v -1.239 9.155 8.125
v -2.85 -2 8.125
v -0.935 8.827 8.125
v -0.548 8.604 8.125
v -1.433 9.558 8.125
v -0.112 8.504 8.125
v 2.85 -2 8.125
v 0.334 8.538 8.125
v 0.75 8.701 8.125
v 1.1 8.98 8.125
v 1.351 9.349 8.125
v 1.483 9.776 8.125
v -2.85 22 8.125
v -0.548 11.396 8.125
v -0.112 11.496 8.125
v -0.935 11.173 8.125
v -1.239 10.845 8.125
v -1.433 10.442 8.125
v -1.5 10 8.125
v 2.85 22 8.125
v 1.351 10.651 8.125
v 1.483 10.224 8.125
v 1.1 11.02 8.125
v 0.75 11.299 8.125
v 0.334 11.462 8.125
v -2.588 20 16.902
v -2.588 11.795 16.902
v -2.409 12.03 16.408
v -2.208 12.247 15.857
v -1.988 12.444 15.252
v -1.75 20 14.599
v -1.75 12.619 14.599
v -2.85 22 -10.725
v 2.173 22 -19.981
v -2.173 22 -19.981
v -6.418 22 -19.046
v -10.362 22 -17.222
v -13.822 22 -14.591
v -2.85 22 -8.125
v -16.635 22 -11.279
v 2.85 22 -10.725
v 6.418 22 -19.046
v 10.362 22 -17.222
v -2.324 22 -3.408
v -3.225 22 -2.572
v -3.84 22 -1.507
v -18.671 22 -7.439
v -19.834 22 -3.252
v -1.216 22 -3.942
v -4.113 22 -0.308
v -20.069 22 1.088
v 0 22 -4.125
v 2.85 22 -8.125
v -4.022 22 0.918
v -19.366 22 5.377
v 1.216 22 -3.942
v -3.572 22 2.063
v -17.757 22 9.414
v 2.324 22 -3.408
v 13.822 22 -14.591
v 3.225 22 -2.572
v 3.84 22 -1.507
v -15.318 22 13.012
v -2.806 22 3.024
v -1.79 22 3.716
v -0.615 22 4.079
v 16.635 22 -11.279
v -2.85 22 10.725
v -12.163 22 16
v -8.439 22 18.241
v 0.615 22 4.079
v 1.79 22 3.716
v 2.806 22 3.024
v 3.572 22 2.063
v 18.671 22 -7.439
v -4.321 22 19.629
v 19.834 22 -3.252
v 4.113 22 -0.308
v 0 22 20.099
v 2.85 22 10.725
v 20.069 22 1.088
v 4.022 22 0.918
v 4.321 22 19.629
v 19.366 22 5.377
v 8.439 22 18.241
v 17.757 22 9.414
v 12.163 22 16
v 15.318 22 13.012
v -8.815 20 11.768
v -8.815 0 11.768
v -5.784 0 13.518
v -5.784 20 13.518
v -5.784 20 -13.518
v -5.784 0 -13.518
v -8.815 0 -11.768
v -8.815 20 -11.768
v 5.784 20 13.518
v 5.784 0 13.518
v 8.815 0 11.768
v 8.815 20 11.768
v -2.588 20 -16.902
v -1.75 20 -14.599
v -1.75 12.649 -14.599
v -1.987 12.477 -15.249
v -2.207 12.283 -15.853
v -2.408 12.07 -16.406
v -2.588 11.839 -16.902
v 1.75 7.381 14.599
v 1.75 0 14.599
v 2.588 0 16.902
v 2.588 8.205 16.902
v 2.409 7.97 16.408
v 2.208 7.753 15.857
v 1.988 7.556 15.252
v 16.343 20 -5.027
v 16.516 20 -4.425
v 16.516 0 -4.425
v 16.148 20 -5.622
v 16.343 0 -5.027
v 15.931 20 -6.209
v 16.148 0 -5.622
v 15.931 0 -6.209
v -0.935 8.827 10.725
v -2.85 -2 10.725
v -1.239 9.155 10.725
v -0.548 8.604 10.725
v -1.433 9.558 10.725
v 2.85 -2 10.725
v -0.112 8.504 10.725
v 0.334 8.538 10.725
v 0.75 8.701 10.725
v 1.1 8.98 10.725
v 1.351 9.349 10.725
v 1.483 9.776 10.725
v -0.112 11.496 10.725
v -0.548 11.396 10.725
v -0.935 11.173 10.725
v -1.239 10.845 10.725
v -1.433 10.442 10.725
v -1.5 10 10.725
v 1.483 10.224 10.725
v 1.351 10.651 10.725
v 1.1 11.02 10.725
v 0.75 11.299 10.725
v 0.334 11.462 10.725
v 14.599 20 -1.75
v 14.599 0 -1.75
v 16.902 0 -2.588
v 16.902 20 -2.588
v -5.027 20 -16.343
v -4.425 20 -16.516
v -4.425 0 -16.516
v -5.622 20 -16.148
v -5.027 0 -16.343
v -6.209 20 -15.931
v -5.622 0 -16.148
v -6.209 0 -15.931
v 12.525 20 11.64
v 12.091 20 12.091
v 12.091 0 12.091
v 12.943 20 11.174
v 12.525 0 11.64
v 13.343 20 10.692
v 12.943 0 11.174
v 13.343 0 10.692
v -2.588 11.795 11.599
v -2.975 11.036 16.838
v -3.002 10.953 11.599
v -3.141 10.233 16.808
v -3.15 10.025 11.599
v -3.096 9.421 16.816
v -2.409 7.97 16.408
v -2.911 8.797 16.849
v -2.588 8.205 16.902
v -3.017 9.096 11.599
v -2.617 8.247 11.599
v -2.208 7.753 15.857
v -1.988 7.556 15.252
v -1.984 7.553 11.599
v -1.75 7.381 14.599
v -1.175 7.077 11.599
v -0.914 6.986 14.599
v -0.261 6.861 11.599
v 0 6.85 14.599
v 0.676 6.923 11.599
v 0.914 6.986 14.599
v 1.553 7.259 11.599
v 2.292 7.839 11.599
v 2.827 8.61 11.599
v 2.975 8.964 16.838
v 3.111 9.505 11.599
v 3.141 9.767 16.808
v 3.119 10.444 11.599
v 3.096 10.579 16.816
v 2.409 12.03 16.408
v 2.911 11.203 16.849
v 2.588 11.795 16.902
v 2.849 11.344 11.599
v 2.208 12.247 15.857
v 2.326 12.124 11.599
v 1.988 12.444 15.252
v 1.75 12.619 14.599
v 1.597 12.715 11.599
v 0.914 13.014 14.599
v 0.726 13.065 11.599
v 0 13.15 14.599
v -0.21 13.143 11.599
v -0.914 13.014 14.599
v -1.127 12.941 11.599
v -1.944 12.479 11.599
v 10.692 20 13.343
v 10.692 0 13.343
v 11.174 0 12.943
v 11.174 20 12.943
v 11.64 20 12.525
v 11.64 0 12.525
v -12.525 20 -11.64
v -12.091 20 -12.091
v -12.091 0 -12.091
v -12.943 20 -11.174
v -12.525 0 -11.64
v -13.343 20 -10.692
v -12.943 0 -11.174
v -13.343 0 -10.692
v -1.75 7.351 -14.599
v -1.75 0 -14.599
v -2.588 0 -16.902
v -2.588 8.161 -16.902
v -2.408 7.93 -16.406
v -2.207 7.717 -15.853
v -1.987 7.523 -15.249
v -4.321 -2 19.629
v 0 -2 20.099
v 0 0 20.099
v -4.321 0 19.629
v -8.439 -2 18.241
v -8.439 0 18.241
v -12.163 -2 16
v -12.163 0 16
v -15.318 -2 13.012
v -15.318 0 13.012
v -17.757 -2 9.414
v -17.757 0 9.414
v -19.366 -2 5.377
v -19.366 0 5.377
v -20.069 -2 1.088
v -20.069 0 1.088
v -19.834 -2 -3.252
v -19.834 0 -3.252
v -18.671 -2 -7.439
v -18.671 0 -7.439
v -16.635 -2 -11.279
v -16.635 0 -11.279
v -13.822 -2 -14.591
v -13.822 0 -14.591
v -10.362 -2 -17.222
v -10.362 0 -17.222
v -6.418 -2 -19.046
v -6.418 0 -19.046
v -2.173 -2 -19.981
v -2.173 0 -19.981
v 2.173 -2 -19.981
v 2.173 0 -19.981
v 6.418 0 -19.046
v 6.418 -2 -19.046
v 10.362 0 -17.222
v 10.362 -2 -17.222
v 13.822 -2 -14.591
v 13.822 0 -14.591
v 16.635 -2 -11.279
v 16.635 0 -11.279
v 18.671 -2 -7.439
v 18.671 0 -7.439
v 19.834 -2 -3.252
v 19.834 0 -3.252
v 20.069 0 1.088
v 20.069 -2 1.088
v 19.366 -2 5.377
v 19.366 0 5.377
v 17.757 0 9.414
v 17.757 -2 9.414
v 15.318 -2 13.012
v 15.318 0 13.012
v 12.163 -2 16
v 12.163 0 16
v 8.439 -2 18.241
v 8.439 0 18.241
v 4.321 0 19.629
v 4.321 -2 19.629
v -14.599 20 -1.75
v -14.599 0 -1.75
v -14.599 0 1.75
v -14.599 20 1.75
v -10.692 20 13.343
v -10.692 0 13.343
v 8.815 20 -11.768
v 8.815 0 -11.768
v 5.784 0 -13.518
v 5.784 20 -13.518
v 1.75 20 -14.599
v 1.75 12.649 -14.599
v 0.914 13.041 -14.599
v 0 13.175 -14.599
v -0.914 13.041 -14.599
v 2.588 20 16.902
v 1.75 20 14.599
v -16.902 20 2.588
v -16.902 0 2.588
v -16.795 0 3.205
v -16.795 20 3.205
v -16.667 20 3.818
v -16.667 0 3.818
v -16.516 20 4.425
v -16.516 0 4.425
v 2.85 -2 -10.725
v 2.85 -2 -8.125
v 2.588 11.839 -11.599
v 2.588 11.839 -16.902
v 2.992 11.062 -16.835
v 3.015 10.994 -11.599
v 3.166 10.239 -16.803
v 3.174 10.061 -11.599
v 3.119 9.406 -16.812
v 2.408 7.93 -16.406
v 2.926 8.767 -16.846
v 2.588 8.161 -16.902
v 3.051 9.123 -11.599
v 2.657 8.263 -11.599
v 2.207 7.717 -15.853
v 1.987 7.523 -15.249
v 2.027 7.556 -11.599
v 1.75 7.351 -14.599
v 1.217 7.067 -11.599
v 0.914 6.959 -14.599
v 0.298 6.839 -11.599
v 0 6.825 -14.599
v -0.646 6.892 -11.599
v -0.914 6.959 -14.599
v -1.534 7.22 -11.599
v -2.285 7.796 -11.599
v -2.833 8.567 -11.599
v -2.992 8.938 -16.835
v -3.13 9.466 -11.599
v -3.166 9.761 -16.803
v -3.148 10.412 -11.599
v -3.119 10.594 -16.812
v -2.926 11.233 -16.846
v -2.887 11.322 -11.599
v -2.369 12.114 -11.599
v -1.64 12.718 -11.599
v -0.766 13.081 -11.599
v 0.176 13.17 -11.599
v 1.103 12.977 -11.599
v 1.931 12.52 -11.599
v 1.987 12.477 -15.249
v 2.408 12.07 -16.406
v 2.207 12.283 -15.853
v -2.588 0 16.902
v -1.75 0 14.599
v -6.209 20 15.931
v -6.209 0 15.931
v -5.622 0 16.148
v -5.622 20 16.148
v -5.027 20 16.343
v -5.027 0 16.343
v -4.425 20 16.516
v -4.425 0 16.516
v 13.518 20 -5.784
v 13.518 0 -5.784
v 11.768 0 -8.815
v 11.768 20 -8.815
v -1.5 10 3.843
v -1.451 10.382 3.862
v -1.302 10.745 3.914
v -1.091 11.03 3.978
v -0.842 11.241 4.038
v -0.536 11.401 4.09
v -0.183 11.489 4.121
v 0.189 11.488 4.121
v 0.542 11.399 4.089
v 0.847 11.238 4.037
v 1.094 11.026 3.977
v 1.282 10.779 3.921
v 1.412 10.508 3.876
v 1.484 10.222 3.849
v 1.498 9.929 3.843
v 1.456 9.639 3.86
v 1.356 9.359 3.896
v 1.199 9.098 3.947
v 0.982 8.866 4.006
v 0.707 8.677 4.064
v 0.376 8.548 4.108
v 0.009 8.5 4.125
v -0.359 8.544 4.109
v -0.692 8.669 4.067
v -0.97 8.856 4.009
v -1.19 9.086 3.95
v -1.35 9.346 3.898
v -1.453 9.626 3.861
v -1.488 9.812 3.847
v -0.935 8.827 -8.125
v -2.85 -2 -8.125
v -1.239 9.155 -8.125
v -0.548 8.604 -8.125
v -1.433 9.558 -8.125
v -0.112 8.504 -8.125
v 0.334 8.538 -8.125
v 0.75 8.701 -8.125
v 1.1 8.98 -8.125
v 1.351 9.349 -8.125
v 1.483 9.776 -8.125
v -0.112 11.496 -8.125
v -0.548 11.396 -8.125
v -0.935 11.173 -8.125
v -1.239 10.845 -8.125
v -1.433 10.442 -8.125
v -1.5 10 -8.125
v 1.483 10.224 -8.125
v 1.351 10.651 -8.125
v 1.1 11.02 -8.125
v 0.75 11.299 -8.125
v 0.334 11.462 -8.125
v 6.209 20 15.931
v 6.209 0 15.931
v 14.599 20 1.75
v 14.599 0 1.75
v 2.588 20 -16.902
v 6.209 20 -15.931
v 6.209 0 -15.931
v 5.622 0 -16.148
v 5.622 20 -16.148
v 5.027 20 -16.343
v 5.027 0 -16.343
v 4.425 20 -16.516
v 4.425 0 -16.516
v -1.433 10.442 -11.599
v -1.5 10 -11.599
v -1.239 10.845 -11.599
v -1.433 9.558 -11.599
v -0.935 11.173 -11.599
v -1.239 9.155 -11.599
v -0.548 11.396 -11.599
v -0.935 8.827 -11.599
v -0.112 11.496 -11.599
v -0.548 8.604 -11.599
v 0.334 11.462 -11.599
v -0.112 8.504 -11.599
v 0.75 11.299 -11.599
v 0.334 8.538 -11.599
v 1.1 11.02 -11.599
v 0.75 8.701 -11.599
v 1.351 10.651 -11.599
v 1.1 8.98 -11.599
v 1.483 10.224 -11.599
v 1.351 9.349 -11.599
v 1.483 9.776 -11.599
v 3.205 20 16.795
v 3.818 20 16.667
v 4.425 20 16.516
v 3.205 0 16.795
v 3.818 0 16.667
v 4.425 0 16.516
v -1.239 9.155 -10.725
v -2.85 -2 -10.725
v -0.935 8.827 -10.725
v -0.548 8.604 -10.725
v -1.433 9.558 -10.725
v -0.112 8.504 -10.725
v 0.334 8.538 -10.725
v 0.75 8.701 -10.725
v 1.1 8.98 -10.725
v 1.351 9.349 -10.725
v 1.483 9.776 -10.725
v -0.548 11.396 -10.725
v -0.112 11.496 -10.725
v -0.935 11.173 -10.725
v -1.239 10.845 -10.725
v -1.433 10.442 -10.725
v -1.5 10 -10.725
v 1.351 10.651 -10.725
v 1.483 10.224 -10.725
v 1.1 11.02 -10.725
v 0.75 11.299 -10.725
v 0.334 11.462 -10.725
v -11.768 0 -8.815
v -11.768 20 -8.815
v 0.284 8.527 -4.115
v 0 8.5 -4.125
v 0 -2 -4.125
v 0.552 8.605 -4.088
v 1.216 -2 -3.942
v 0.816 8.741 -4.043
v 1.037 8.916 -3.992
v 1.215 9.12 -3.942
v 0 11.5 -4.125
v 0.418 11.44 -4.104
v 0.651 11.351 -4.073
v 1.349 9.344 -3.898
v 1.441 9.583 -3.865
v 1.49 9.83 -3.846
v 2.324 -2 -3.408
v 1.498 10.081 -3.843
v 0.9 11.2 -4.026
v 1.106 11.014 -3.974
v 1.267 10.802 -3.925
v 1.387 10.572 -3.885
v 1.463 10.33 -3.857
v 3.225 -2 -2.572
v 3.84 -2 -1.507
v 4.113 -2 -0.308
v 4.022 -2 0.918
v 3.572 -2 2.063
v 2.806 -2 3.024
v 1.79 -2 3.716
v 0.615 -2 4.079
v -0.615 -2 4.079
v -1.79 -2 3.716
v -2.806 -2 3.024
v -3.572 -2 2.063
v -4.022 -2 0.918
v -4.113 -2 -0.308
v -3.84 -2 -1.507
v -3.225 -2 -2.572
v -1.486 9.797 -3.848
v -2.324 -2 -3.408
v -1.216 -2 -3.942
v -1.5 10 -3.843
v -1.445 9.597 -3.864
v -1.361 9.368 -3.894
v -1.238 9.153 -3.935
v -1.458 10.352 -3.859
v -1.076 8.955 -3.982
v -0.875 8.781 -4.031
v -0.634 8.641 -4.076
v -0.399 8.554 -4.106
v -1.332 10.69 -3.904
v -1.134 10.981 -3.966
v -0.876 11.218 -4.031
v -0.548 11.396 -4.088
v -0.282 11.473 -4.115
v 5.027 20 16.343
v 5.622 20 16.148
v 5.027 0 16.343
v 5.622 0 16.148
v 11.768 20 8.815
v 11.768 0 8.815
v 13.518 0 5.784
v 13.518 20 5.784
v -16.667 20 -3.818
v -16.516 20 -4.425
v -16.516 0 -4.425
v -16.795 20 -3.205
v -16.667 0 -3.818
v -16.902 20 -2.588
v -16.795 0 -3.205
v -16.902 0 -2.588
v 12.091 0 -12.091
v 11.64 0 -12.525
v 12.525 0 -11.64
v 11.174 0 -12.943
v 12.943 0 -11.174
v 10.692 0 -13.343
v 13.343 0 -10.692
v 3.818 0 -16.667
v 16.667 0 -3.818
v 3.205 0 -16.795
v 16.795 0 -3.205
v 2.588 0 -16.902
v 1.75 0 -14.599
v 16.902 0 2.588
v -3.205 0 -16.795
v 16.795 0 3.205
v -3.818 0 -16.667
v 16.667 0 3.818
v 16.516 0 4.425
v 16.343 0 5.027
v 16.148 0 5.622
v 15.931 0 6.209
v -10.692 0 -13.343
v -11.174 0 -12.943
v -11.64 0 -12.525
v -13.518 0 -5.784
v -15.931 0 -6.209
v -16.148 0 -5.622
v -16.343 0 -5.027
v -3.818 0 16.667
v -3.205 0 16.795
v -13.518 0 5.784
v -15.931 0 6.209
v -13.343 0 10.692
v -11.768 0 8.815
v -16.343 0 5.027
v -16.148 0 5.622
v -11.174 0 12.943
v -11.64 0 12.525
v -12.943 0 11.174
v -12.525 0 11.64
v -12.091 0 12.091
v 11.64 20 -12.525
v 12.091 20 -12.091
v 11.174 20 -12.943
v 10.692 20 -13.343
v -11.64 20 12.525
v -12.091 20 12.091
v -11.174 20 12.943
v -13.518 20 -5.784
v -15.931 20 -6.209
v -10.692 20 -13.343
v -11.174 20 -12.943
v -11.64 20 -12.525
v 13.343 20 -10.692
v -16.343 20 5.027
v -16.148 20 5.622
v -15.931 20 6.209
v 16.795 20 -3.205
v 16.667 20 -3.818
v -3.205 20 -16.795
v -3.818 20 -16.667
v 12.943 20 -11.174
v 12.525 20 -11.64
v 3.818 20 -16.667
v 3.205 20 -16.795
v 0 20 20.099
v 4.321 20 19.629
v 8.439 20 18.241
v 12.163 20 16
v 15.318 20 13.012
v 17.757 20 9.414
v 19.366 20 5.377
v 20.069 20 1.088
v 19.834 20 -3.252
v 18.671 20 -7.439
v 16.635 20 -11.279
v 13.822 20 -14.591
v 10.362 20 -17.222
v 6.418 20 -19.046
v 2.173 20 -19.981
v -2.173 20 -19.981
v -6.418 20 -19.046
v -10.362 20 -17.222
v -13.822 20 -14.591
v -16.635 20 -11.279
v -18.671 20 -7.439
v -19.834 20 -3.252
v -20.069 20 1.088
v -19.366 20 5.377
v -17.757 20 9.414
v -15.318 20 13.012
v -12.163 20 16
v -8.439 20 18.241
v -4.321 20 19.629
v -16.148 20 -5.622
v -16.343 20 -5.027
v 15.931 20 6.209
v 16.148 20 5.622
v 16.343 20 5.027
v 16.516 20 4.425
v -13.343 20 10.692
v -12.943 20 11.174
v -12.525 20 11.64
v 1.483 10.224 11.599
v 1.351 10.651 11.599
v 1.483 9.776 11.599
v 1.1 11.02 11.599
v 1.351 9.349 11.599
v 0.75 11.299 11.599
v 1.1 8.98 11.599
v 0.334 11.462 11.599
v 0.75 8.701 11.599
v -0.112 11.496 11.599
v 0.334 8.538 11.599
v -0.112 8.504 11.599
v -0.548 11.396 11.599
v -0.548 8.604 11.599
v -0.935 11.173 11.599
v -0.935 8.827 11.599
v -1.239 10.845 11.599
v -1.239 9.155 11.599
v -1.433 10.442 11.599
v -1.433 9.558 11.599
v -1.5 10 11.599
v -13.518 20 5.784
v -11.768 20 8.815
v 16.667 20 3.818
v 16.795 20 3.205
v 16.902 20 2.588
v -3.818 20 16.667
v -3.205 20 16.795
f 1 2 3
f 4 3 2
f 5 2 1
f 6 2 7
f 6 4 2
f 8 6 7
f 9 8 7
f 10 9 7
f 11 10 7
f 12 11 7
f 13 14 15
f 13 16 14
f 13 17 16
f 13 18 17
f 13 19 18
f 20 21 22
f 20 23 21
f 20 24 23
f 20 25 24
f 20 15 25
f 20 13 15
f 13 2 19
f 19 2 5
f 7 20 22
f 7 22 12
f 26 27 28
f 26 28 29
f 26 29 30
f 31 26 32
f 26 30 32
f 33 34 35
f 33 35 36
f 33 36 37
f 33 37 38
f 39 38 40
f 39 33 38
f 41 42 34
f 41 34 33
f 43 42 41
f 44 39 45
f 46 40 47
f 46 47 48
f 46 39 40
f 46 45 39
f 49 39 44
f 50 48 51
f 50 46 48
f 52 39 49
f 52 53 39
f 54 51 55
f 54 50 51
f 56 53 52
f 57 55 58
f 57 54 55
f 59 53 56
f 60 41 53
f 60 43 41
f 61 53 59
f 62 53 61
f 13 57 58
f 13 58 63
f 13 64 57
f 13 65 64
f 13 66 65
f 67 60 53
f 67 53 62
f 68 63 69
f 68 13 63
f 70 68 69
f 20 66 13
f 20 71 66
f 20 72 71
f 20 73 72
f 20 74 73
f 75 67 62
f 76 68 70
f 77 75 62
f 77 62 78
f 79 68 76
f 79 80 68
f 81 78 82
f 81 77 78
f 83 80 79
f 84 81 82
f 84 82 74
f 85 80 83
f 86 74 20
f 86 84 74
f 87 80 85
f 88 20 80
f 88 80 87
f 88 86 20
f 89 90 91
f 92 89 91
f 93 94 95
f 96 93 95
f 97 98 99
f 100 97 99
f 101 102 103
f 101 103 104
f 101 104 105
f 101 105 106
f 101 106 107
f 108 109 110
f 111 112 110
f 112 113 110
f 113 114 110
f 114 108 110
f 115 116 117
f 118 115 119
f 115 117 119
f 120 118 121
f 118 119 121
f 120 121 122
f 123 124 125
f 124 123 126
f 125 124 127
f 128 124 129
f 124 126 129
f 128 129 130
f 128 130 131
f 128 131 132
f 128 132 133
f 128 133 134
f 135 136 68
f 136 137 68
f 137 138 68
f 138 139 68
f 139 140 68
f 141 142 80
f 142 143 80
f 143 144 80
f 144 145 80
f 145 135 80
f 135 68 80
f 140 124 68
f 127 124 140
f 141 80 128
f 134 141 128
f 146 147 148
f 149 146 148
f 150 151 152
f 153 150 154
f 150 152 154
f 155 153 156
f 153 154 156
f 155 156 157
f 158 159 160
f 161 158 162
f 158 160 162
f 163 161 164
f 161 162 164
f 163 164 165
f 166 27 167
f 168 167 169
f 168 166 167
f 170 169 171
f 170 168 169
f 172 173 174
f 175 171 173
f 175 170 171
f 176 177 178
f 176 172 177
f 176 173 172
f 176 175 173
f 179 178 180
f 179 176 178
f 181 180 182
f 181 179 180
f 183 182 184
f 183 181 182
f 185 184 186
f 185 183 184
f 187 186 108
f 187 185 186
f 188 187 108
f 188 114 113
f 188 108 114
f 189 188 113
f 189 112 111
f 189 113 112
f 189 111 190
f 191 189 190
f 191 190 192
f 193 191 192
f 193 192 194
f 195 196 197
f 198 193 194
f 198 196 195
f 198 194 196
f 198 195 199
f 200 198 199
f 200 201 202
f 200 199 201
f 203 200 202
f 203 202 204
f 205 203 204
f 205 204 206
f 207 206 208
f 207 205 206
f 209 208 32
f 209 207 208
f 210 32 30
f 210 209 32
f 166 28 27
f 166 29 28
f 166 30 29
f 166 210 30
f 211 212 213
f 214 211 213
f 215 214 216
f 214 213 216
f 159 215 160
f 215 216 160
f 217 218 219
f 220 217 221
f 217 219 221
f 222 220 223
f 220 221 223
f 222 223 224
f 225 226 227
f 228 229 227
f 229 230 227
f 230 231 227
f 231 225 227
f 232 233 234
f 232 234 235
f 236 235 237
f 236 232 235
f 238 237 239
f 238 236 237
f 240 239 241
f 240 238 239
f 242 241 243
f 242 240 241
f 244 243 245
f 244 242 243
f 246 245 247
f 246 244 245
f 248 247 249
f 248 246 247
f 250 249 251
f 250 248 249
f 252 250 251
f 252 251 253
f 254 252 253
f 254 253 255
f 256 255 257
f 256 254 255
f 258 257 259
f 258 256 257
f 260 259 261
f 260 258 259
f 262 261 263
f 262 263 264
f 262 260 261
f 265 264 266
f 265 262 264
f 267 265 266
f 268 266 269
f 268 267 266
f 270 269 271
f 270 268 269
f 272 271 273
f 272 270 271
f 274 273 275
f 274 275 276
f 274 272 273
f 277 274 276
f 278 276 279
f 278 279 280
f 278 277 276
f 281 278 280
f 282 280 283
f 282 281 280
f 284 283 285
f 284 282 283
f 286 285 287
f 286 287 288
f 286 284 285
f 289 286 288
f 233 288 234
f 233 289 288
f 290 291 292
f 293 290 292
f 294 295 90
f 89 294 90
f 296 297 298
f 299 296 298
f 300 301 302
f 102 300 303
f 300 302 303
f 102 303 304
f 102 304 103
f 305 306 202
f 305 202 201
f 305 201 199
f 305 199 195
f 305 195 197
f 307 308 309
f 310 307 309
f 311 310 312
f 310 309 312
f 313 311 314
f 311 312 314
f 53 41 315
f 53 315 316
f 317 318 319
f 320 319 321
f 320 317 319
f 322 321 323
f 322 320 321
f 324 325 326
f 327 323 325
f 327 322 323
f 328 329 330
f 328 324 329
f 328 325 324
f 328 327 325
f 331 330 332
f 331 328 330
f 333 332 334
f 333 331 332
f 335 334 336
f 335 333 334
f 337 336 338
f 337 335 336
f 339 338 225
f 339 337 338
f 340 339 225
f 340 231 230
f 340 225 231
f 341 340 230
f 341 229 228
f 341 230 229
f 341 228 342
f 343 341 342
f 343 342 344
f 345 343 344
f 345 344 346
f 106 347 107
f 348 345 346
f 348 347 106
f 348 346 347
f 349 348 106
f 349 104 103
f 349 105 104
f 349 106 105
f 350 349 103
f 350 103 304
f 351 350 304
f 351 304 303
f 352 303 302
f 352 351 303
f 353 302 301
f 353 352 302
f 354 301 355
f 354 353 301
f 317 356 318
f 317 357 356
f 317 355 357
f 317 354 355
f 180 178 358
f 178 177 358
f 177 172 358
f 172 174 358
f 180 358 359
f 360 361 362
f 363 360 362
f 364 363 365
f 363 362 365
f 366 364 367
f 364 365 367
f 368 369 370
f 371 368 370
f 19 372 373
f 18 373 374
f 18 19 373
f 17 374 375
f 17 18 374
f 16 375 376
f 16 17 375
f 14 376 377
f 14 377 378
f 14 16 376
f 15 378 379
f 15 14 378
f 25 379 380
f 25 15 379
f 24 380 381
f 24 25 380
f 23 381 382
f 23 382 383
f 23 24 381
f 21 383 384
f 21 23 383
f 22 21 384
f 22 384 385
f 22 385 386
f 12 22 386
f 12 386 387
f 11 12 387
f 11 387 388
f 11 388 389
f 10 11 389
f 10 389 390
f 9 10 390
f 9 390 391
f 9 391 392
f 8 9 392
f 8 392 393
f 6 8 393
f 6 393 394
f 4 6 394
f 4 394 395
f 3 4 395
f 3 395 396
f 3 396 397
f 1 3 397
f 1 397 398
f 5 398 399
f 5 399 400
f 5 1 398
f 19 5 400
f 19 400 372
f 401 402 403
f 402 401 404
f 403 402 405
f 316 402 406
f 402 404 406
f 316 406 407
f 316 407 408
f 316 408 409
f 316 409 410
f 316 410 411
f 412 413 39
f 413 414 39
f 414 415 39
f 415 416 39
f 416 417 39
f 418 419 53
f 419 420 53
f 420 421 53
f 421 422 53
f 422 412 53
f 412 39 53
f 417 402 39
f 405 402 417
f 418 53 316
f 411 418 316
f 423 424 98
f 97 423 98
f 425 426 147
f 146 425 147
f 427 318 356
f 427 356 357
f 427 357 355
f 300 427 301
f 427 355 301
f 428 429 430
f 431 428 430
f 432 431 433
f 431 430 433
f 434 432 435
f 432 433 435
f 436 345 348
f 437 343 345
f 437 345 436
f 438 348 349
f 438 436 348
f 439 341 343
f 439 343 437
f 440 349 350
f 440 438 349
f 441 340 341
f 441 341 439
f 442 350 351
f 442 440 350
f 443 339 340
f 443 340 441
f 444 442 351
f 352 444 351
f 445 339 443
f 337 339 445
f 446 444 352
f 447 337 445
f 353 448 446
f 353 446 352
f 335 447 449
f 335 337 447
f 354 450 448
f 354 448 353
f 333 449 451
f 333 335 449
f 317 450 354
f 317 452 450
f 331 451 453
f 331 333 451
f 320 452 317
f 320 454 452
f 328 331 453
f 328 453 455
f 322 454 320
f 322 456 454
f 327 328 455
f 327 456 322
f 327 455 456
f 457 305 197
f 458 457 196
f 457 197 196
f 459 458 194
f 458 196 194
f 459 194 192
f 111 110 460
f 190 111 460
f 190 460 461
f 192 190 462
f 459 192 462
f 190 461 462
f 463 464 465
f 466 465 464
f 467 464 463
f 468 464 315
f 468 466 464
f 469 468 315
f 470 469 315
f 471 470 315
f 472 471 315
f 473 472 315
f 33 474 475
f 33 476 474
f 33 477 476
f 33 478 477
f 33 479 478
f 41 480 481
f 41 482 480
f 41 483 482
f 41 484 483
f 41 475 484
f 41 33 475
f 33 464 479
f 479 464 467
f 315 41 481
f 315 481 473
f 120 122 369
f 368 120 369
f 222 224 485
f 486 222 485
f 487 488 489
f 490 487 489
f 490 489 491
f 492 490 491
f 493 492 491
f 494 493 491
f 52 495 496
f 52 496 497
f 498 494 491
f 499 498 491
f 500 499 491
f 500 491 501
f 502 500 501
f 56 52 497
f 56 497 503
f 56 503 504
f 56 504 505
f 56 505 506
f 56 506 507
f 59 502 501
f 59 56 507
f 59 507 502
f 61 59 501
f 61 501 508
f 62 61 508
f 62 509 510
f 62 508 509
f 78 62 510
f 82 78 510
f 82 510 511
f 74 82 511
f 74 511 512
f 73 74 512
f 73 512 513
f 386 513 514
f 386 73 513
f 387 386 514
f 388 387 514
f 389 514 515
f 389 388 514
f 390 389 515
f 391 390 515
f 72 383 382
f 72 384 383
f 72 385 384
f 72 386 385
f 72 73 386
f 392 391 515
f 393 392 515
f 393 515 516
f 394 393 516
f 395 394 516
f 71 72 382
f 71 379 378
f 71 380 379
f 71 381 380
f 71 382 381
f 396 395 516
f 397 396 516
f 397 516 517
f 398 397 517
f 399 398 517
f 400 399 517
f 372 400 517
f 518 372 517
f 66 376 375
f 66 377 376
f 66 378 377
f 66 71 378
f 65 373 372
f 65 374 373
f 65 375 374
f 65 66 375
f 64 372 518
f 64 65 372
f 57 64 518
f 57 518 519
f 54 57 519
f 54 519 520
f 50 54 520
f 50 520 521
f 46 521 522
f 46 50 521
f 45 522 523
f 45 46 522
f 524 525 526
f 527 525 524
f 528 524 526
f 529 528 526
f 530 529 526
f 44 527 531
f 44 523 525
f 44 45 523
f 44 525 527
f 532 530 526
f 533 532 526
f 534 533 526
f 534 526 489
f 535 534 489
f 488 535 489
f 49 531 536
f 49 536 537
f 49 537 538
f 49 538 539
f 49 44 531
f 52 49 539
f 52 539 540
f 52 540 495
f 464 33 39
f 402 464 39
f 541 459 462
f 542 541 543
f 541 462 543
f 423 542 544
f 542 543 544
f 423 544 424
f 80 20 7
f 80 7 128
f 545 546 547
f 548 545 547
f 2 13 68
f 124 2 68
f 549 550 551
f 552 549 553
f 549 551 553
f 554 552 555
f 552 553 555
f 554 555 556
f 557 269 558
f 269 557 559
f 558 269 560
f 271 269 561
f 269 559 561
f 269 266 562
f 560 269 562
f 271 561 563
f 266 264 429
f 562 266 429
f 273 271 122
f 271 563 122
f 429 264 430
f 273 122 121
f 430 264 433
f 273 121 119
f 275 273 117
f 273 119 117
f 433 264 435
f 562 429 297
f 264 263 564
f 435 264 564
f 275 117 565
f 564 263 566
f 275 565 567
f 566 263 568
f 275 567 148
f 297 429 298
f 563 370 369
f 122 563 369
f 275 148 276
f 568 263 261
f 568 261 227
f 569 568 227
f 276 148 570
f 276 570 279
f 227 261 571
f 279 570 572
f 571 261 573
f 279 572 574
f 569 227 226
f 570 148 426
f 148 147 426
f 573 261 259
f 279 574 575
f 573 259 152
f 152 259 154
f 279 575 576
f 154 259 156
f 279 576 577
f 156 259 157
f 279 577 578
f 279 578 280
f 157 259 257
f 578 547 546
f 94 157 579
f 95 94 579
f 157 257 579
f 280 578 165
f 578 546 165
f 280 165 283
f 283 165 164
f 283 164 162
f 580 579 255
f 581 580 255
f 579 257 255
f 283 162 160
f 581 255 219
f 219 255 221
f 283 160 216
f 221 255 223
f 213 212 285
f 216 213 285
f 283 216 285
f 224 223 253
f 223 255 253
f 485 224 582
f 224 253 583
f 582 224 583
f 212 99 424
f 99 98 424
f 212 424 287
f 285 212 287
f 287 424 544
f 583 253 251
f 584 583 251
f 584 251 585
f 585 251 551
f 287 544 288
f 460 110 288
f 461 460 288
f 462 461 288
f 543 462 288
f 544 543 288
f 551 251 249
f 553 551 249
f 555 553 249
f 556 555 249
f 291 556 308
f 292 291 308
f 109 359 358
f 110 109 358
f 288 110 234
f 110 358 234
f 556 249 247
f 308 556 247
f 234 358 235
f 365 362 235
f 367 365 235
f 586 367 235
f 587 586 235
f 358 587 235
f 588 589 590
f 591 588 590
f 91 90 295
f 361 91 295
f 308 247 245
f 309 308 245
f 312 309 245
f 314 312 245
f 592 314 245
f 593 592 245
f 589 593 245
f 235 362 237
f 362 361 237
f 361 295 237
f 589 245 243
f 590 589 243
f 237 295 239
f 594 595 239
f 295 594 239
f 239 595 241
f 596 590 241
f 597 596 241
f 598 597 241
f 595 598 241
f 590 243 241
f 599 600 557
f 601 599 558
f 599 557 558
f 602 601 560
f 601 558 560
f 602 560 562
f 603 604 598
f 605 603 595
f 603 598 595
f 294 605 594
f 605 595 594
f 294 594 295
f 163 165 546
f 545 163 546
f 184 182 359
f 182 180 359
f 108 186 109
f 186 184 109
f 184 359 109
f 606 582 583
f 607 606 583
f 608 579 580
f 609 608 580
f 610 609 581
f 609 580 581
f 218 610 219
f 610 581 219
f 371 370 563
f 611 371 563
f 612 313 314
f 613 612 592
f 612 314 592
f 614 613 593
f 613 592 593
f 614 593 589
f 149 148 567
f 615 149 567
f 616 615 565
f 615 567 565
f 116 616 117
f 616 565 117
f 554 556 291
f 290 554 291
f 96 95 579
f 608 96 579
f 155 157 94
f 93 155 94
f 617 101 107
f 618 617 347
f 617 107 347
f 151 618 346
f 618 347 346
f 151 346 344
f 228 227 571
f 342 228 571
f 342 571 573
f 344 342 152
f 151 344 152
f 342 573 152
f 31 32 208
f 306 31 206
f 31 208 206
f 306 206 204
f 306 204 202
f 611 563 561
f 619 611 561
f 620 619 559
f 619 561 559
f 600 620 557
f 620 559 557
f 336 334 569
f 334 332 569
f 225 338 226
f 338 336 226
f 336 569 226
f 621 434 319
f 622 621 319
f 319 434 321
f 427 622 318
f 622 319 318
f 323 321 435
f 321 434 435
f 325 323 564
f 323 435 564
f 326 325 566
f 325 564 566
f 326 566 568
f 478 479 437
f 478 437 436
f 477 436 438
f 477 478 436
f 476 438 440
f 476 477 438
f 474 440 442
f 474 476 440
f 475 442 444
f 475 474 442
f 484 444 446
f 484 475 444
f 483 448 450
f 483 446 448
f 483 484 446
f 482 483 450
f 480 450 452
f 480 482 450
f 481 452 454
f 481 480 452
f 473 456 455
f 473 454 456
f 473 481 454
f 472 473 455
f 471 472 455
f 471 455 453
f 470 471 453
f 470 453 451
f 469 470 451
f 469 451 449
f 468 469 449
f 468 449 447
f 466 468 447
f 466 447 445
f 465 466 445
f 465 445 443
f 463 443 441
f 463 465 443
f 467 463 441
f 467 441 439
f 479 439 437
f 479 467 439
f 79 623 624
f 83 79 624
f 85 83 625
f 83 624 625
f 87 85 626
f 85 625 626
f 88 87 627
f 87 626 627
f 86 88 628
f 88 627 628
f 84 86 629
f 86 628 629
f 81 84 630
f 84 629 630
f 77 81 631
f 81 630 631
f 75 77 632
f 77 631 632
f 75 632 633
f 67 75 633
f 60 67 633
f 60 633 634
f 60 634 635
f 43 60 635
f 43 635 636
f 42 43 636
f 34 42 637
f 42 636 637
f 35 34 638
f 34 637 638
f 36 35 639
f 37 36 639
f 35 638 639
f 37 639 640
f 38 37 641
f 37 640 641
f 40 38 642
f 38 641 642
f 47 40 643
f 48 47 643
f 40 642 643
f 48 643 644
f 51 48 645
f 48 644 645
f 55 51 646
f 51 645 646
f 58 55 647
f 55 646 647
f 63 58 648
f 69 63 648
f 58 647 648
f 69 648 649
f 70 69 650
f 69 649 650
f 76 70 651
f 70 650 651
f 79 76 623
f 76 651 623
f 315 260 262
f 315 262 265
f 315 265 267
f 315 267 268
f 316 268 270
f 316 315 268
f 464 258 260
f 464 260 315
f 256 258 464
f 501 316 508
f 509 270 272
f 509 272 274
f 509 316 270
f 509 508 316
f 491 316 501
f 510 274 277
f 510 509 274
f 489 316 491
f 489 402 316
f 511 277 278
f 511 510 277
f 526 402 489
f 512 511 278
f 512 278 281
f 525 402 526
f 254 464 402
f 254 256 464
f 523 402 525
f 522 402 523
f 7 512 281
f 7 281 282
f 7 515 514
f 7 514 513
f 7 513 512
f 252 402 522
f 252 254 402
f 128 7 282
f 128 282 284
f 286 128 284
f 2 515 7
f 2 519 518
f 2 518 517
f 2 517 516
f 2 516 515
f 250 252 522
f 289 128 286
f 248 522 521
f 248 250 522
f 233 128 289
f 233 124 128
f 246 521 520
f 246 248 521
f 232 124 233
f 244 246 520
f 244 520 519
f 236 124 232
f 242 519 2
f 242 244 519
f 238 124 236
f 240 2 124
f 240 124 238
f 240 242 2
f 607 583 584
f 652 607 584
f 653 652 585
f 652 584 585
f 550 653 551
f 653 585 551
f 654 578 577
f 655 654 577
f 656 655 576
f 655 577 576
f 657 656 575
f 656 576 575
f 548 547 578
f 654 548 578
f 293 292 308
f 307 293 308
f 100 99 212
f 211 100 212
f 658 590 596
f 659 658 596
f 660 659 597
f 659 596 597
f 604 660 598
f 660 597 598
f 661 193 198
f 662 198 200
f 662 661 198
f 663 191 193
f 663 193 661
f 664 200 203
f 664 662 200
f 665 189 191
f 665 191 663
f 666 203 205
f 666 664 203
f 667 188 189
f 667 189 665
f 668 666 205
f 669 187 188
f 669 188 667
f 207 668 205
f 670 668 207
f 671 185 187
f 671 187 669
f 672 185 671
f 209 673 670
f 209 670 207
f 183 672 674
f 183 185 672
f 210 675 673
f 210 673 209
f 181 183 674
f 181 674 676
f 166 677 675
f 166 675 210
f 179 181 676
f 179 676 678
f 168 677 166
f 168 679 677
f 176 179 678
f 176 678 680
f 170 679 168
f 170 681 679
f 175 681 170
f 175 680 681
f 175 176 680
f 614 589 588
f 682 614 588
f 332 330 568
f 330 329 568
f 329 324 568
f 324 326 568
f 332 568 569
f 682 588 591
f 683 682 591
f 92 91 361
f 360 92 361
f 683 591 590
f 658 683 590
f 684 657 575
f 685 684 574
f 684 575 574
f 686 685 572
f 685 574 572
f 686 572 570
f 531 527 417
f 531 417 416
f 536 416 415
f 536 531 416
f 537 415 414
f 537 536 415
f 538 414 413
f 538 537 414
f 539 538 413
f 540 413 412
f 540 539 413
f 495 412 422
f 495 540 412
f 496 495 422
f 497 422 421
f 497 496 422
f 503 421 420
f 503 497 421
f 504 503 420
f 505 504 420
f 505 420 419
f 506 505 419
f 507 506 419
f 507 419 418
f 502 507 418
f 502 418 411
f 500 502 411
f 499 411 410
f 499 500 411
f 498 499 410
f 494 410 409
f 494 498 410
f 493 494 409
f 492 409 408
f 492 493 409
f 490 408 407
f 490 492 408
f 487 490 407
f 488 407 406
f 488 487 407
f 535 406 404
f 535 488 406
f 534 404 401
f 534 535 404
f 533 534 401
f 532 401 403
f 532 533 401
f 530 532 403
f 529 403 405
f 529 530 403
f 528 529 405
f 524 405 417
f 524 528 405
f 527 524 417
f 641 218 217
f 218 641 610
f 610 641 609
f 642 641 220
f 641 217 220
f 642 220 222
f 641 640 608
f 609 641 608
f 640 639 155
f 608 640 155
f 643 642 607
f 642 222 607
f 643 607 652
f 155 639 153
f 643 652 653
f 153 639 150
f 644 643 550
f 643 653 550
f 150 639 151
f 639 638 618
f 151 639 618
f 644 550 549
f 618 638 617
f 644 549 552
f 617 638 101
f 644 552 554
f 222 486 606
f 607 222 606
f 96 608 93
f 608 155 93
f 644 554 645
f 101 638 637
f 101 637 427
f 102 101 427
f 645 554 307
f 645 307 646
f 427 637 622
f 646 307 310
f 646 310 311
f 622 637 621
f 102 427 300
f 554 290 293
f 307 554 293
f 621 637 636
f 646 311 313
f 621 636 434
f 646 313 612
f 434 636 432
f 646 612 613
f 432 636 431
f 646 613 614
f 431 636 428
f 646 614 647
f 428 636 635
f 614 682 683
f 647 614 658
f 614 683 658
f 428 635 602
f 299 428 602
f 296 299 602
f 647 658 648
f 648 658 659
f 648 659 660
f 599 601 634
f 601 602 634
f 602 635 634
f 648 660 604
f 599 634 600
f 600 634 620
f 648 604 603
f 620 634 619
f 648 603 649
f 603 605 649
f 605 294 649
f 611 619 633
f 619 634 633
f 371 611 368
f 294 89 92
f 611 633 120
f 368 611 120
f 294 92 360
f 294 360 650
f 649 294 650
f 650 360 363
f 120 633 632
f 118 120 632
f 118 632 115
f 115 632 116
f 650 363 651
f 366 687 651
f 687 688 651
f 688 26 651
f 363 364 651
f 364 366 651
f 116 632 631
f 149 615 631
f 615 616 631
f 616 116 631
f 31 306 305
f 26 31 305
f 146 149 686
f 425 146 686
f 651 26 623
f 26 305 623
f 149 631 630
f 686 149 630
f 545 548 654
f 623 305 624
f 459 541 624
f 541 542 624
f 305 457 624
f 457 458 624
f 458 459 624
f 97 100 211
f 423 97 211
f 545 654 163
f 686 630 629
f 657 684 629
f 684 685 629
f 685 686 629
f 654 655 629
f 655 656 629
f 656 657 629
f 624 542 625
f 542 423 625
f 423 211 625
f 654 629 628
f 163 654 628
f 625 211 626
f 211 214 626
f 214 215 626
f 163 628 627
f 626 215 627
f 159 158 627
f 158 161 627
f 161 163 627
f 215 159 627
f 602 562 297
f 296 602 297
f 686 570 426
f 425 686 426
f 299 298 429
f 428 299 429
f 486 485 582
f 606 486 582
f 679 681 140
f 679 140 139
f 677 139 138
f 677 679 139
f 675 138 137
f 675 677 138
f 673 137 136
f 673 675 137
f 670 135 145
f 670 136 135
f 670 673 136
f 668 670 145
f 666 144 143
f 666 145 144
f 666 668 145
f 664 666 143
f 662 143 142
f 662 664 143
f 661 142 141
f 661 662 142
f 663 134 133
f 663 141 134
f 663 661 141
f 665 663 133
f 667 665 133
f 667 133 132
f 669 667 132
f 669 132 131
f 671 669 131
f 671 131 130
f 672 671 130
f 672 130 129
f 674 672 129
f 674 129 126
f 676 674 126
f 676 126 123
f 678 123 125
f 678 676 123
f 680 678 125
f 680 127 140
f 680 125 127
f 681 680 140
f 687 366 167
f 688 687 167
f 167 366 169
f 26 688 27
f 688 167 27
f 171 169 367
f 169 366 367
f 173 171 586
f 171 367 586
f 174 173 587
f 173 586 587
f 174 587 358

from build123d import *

# Parameters (mm, degrees)
SKETCH2_R               = 19.098593171
BOSS_EXTRUDE2_DEPTH     = 20
CUT_EXTRUDE1_START      = -20
CUT_EXTRUDE1_DEPTH      = 20
CIRPATTERN2_COUNT       = 12
SKETCH6_R               = 20.098593171
BOSS_EXTRUDE3_DEPTH     = 2
BOSS_EXTRUDE4_START     = 2
SKETCH7_R               = 20.098593171
BOSS_EXTRUDE4_DEPTH     = 2
CUT_EXTRUDE3_DEPTH      = 38.200899114
CUT_EXTRUDE3_DEPTH_BACK = 38.200899114
SKETCH8_R               = 4.125
SKETCH8_W               = 5.7
SKETCH8_H               = 2.6
CUT_EXTRUDE4_DEPTH      = 46.7367269
CUT_EXTRUDE4_DEPTH_BACK = 46.7367269
SKETCH10_R              = 1.5
CUT_EXTRUDE5_DEPTH      = 10
CUT_EXTRUDE5_DEPTH_BACK = 3
SKETCH11_R              = 3.175
CUT_EXTRUDE6_DEPTH      = 10
CUT_EXTRUDE6_DEPTH_BACK = 3
SKETCH12_R              = 3.15


with BuildPart() as part:
    # Sketch2 → Boss-Extrude2 (new body)
    with BuildSketch(Plane(origin=(0, 0, 0), x_dir=(1, 0, 0), z_dir=(0, 1, 0))):
        with Locations(Location((0, 0, 0), (0, 0, 270))):
            Circle(SKETCH2_R)
    extrude(amount=BOSS_EXTRUDE2_DEPTH)

    # Sketch3 → Cut-Extrude1 (cut)
    with BuildSketch(Plane(origin=(0, 20, 0), x_dir=(1, 0, 0), z_dir=(0, 1, 0)).offset(CUT_EXTRUDE1_START)):
        with BuildLine():
            Line((1.75, 14.598593171), (-1.75, 14.598593171))
            Line((-1.75, 14.598593171), (-2.588214639, 16.901568963))
            ThreePointArc((-2.588214639, 16.901568963), (-3.512123919, 16.734003526), (-4.425441557, 16.515972737))
            Line((-4.425441557, 16.515972737), (-4.943079647, 18.44782439))
            ThreePointArc((-4.943079647, 18.44782439), (0, 19.098593171), (4.943079647, 18.44782439))
            Line((4.943079647, 18.44782439), (4.425441557, 16.515972737))
            ThreePointArc((4.425441557, 16.515972737), (3.512123919, 16.734003526), (2.588214639, 16.901568963))
            Line((2.588214639, 16.901568963), (1.75, 14.598593171))
        make_face()
    cut_extrude1 = extrude(amount=CUT_EXTRUDE1_DEPTH, mode=Mode.SUBTRACT)

    # CirPattern2: Cut-Extrude1 ×12 about axis
    cirpattern2_axis = Axis((0, 0, 0), (0, 1, 0))
    for i in range(1, CIRPATTERN2_COUNT):
        add(cut_extrude1.rotate(cirpattern2_axis, i * 360 / CIRPATTERN2_COUNT), mode=Mode.SUBTRACT)

    # Sketch6 → Boss-Extrude3 (add)
    with BuildSketch(Plane(origin=(0, 20, 0), x_dir=(1, 0, 0), z_dir=(0, 1, 0))):
        with Locations(Location((0, 0, 0), (0, 0, 270))):
            Circle(SKETCH6_R)
    extrude(amount=BOSS_EXTRUDE3_DEPTH)

    # Sketch7 → Boss-Extrude4 (add)
    with BuildSketch(Plane.XZ.offset(BOSS_EXTRUDE4_START)):
        with Locations(Location((0, 0, 0), (0, 0, 90))):
            Circle(SKETCH7_R)
    extrude(amount=-BOSS_EXTRUDE4_DEPTH)

    # Sketch8 → Cut-Extrude3 (cut, two sides: drawn at the far end of the back side and taken through both)
    with BuildSketch(Plane.XZ.offset(2).offset(-CUT_EXTRUDE3_DEPTH_BACK)):
        with Locations(Location((0, 0, 0), (0, 0, 270))):
            Circle(SKETCH8_R)
        with Locations((0, 9.425)):
            Rectangle(SKETCH8_W, SKETCH8_H)
        with Locations((0, -9.425)):
            Rectangle(SKETCH8_W, SKETCH8_H)
    extrude(amount=CUT_EXTRUDE3_DEPTH + CUT_EXTRUDE3_DEPTH_BACK, mode=Mode.SUBTRACT)

    # Sketch10 → Cut-Extrude4 (cut, two sides: drawn at the far end of the back side and taken through both)
    with BuildSketch(Plane(origin=(0, 0, -14.598593171), x_dir=(-1, 0, 0), z_dir=(0, 0, -1)).offset(-CUT_EXTRUDE4_DEPTH_BACK)):
        with Locations((0, 10)):
            Circle(SKETCH10_R)
    extrude(amount=CUT_EXTRUDE4_DEPTH + CUT_EXTRUDE4_DEPTH_BACK, mode=Mode.SUBTRACT)

    # Sketch11 → Cut-Extrude5 (cut, two sides: drawn at the far end of the back side and taken through both)
    with BuildSketch(Plane(origin=(0, 0, -14.598593171), x_dir=(-1, 0, 0), z_dir=(0, 0, -1)).offset(-CUT_EXTRUDE5_DEPTH_BACK)):
        with Locations(Location((0, 10, 0), (0, 0, 144.605728901))):
            Circle(SKETCH11_R)
    extrude(amount=CUT_EXTRUDE5_DEPTH + CUT_EXTRUDE5_DEPTH_BACK, mode=Mode.SUBTRACT)

    # Sketch12 → Cut-Extrude6 (cut, two sides: drawn at the far end of the back side and taken through both)
    with BuildSketch(Plane.XY.offset(14.598593171).offset(-CUT_EXTRUDE6_DEPTH_BACK)):
        with Locations(Location((0, 10, 0), (0, 0, 145.250854713))):
            Circle(SKETCH12_R)
    extrude(amount=CUT_EXTRUDE6_DEPTH + CUT_EXTRUDE6_DEPTH_BACK, mode=Mode.SUBTRACT)


solid = part.part
